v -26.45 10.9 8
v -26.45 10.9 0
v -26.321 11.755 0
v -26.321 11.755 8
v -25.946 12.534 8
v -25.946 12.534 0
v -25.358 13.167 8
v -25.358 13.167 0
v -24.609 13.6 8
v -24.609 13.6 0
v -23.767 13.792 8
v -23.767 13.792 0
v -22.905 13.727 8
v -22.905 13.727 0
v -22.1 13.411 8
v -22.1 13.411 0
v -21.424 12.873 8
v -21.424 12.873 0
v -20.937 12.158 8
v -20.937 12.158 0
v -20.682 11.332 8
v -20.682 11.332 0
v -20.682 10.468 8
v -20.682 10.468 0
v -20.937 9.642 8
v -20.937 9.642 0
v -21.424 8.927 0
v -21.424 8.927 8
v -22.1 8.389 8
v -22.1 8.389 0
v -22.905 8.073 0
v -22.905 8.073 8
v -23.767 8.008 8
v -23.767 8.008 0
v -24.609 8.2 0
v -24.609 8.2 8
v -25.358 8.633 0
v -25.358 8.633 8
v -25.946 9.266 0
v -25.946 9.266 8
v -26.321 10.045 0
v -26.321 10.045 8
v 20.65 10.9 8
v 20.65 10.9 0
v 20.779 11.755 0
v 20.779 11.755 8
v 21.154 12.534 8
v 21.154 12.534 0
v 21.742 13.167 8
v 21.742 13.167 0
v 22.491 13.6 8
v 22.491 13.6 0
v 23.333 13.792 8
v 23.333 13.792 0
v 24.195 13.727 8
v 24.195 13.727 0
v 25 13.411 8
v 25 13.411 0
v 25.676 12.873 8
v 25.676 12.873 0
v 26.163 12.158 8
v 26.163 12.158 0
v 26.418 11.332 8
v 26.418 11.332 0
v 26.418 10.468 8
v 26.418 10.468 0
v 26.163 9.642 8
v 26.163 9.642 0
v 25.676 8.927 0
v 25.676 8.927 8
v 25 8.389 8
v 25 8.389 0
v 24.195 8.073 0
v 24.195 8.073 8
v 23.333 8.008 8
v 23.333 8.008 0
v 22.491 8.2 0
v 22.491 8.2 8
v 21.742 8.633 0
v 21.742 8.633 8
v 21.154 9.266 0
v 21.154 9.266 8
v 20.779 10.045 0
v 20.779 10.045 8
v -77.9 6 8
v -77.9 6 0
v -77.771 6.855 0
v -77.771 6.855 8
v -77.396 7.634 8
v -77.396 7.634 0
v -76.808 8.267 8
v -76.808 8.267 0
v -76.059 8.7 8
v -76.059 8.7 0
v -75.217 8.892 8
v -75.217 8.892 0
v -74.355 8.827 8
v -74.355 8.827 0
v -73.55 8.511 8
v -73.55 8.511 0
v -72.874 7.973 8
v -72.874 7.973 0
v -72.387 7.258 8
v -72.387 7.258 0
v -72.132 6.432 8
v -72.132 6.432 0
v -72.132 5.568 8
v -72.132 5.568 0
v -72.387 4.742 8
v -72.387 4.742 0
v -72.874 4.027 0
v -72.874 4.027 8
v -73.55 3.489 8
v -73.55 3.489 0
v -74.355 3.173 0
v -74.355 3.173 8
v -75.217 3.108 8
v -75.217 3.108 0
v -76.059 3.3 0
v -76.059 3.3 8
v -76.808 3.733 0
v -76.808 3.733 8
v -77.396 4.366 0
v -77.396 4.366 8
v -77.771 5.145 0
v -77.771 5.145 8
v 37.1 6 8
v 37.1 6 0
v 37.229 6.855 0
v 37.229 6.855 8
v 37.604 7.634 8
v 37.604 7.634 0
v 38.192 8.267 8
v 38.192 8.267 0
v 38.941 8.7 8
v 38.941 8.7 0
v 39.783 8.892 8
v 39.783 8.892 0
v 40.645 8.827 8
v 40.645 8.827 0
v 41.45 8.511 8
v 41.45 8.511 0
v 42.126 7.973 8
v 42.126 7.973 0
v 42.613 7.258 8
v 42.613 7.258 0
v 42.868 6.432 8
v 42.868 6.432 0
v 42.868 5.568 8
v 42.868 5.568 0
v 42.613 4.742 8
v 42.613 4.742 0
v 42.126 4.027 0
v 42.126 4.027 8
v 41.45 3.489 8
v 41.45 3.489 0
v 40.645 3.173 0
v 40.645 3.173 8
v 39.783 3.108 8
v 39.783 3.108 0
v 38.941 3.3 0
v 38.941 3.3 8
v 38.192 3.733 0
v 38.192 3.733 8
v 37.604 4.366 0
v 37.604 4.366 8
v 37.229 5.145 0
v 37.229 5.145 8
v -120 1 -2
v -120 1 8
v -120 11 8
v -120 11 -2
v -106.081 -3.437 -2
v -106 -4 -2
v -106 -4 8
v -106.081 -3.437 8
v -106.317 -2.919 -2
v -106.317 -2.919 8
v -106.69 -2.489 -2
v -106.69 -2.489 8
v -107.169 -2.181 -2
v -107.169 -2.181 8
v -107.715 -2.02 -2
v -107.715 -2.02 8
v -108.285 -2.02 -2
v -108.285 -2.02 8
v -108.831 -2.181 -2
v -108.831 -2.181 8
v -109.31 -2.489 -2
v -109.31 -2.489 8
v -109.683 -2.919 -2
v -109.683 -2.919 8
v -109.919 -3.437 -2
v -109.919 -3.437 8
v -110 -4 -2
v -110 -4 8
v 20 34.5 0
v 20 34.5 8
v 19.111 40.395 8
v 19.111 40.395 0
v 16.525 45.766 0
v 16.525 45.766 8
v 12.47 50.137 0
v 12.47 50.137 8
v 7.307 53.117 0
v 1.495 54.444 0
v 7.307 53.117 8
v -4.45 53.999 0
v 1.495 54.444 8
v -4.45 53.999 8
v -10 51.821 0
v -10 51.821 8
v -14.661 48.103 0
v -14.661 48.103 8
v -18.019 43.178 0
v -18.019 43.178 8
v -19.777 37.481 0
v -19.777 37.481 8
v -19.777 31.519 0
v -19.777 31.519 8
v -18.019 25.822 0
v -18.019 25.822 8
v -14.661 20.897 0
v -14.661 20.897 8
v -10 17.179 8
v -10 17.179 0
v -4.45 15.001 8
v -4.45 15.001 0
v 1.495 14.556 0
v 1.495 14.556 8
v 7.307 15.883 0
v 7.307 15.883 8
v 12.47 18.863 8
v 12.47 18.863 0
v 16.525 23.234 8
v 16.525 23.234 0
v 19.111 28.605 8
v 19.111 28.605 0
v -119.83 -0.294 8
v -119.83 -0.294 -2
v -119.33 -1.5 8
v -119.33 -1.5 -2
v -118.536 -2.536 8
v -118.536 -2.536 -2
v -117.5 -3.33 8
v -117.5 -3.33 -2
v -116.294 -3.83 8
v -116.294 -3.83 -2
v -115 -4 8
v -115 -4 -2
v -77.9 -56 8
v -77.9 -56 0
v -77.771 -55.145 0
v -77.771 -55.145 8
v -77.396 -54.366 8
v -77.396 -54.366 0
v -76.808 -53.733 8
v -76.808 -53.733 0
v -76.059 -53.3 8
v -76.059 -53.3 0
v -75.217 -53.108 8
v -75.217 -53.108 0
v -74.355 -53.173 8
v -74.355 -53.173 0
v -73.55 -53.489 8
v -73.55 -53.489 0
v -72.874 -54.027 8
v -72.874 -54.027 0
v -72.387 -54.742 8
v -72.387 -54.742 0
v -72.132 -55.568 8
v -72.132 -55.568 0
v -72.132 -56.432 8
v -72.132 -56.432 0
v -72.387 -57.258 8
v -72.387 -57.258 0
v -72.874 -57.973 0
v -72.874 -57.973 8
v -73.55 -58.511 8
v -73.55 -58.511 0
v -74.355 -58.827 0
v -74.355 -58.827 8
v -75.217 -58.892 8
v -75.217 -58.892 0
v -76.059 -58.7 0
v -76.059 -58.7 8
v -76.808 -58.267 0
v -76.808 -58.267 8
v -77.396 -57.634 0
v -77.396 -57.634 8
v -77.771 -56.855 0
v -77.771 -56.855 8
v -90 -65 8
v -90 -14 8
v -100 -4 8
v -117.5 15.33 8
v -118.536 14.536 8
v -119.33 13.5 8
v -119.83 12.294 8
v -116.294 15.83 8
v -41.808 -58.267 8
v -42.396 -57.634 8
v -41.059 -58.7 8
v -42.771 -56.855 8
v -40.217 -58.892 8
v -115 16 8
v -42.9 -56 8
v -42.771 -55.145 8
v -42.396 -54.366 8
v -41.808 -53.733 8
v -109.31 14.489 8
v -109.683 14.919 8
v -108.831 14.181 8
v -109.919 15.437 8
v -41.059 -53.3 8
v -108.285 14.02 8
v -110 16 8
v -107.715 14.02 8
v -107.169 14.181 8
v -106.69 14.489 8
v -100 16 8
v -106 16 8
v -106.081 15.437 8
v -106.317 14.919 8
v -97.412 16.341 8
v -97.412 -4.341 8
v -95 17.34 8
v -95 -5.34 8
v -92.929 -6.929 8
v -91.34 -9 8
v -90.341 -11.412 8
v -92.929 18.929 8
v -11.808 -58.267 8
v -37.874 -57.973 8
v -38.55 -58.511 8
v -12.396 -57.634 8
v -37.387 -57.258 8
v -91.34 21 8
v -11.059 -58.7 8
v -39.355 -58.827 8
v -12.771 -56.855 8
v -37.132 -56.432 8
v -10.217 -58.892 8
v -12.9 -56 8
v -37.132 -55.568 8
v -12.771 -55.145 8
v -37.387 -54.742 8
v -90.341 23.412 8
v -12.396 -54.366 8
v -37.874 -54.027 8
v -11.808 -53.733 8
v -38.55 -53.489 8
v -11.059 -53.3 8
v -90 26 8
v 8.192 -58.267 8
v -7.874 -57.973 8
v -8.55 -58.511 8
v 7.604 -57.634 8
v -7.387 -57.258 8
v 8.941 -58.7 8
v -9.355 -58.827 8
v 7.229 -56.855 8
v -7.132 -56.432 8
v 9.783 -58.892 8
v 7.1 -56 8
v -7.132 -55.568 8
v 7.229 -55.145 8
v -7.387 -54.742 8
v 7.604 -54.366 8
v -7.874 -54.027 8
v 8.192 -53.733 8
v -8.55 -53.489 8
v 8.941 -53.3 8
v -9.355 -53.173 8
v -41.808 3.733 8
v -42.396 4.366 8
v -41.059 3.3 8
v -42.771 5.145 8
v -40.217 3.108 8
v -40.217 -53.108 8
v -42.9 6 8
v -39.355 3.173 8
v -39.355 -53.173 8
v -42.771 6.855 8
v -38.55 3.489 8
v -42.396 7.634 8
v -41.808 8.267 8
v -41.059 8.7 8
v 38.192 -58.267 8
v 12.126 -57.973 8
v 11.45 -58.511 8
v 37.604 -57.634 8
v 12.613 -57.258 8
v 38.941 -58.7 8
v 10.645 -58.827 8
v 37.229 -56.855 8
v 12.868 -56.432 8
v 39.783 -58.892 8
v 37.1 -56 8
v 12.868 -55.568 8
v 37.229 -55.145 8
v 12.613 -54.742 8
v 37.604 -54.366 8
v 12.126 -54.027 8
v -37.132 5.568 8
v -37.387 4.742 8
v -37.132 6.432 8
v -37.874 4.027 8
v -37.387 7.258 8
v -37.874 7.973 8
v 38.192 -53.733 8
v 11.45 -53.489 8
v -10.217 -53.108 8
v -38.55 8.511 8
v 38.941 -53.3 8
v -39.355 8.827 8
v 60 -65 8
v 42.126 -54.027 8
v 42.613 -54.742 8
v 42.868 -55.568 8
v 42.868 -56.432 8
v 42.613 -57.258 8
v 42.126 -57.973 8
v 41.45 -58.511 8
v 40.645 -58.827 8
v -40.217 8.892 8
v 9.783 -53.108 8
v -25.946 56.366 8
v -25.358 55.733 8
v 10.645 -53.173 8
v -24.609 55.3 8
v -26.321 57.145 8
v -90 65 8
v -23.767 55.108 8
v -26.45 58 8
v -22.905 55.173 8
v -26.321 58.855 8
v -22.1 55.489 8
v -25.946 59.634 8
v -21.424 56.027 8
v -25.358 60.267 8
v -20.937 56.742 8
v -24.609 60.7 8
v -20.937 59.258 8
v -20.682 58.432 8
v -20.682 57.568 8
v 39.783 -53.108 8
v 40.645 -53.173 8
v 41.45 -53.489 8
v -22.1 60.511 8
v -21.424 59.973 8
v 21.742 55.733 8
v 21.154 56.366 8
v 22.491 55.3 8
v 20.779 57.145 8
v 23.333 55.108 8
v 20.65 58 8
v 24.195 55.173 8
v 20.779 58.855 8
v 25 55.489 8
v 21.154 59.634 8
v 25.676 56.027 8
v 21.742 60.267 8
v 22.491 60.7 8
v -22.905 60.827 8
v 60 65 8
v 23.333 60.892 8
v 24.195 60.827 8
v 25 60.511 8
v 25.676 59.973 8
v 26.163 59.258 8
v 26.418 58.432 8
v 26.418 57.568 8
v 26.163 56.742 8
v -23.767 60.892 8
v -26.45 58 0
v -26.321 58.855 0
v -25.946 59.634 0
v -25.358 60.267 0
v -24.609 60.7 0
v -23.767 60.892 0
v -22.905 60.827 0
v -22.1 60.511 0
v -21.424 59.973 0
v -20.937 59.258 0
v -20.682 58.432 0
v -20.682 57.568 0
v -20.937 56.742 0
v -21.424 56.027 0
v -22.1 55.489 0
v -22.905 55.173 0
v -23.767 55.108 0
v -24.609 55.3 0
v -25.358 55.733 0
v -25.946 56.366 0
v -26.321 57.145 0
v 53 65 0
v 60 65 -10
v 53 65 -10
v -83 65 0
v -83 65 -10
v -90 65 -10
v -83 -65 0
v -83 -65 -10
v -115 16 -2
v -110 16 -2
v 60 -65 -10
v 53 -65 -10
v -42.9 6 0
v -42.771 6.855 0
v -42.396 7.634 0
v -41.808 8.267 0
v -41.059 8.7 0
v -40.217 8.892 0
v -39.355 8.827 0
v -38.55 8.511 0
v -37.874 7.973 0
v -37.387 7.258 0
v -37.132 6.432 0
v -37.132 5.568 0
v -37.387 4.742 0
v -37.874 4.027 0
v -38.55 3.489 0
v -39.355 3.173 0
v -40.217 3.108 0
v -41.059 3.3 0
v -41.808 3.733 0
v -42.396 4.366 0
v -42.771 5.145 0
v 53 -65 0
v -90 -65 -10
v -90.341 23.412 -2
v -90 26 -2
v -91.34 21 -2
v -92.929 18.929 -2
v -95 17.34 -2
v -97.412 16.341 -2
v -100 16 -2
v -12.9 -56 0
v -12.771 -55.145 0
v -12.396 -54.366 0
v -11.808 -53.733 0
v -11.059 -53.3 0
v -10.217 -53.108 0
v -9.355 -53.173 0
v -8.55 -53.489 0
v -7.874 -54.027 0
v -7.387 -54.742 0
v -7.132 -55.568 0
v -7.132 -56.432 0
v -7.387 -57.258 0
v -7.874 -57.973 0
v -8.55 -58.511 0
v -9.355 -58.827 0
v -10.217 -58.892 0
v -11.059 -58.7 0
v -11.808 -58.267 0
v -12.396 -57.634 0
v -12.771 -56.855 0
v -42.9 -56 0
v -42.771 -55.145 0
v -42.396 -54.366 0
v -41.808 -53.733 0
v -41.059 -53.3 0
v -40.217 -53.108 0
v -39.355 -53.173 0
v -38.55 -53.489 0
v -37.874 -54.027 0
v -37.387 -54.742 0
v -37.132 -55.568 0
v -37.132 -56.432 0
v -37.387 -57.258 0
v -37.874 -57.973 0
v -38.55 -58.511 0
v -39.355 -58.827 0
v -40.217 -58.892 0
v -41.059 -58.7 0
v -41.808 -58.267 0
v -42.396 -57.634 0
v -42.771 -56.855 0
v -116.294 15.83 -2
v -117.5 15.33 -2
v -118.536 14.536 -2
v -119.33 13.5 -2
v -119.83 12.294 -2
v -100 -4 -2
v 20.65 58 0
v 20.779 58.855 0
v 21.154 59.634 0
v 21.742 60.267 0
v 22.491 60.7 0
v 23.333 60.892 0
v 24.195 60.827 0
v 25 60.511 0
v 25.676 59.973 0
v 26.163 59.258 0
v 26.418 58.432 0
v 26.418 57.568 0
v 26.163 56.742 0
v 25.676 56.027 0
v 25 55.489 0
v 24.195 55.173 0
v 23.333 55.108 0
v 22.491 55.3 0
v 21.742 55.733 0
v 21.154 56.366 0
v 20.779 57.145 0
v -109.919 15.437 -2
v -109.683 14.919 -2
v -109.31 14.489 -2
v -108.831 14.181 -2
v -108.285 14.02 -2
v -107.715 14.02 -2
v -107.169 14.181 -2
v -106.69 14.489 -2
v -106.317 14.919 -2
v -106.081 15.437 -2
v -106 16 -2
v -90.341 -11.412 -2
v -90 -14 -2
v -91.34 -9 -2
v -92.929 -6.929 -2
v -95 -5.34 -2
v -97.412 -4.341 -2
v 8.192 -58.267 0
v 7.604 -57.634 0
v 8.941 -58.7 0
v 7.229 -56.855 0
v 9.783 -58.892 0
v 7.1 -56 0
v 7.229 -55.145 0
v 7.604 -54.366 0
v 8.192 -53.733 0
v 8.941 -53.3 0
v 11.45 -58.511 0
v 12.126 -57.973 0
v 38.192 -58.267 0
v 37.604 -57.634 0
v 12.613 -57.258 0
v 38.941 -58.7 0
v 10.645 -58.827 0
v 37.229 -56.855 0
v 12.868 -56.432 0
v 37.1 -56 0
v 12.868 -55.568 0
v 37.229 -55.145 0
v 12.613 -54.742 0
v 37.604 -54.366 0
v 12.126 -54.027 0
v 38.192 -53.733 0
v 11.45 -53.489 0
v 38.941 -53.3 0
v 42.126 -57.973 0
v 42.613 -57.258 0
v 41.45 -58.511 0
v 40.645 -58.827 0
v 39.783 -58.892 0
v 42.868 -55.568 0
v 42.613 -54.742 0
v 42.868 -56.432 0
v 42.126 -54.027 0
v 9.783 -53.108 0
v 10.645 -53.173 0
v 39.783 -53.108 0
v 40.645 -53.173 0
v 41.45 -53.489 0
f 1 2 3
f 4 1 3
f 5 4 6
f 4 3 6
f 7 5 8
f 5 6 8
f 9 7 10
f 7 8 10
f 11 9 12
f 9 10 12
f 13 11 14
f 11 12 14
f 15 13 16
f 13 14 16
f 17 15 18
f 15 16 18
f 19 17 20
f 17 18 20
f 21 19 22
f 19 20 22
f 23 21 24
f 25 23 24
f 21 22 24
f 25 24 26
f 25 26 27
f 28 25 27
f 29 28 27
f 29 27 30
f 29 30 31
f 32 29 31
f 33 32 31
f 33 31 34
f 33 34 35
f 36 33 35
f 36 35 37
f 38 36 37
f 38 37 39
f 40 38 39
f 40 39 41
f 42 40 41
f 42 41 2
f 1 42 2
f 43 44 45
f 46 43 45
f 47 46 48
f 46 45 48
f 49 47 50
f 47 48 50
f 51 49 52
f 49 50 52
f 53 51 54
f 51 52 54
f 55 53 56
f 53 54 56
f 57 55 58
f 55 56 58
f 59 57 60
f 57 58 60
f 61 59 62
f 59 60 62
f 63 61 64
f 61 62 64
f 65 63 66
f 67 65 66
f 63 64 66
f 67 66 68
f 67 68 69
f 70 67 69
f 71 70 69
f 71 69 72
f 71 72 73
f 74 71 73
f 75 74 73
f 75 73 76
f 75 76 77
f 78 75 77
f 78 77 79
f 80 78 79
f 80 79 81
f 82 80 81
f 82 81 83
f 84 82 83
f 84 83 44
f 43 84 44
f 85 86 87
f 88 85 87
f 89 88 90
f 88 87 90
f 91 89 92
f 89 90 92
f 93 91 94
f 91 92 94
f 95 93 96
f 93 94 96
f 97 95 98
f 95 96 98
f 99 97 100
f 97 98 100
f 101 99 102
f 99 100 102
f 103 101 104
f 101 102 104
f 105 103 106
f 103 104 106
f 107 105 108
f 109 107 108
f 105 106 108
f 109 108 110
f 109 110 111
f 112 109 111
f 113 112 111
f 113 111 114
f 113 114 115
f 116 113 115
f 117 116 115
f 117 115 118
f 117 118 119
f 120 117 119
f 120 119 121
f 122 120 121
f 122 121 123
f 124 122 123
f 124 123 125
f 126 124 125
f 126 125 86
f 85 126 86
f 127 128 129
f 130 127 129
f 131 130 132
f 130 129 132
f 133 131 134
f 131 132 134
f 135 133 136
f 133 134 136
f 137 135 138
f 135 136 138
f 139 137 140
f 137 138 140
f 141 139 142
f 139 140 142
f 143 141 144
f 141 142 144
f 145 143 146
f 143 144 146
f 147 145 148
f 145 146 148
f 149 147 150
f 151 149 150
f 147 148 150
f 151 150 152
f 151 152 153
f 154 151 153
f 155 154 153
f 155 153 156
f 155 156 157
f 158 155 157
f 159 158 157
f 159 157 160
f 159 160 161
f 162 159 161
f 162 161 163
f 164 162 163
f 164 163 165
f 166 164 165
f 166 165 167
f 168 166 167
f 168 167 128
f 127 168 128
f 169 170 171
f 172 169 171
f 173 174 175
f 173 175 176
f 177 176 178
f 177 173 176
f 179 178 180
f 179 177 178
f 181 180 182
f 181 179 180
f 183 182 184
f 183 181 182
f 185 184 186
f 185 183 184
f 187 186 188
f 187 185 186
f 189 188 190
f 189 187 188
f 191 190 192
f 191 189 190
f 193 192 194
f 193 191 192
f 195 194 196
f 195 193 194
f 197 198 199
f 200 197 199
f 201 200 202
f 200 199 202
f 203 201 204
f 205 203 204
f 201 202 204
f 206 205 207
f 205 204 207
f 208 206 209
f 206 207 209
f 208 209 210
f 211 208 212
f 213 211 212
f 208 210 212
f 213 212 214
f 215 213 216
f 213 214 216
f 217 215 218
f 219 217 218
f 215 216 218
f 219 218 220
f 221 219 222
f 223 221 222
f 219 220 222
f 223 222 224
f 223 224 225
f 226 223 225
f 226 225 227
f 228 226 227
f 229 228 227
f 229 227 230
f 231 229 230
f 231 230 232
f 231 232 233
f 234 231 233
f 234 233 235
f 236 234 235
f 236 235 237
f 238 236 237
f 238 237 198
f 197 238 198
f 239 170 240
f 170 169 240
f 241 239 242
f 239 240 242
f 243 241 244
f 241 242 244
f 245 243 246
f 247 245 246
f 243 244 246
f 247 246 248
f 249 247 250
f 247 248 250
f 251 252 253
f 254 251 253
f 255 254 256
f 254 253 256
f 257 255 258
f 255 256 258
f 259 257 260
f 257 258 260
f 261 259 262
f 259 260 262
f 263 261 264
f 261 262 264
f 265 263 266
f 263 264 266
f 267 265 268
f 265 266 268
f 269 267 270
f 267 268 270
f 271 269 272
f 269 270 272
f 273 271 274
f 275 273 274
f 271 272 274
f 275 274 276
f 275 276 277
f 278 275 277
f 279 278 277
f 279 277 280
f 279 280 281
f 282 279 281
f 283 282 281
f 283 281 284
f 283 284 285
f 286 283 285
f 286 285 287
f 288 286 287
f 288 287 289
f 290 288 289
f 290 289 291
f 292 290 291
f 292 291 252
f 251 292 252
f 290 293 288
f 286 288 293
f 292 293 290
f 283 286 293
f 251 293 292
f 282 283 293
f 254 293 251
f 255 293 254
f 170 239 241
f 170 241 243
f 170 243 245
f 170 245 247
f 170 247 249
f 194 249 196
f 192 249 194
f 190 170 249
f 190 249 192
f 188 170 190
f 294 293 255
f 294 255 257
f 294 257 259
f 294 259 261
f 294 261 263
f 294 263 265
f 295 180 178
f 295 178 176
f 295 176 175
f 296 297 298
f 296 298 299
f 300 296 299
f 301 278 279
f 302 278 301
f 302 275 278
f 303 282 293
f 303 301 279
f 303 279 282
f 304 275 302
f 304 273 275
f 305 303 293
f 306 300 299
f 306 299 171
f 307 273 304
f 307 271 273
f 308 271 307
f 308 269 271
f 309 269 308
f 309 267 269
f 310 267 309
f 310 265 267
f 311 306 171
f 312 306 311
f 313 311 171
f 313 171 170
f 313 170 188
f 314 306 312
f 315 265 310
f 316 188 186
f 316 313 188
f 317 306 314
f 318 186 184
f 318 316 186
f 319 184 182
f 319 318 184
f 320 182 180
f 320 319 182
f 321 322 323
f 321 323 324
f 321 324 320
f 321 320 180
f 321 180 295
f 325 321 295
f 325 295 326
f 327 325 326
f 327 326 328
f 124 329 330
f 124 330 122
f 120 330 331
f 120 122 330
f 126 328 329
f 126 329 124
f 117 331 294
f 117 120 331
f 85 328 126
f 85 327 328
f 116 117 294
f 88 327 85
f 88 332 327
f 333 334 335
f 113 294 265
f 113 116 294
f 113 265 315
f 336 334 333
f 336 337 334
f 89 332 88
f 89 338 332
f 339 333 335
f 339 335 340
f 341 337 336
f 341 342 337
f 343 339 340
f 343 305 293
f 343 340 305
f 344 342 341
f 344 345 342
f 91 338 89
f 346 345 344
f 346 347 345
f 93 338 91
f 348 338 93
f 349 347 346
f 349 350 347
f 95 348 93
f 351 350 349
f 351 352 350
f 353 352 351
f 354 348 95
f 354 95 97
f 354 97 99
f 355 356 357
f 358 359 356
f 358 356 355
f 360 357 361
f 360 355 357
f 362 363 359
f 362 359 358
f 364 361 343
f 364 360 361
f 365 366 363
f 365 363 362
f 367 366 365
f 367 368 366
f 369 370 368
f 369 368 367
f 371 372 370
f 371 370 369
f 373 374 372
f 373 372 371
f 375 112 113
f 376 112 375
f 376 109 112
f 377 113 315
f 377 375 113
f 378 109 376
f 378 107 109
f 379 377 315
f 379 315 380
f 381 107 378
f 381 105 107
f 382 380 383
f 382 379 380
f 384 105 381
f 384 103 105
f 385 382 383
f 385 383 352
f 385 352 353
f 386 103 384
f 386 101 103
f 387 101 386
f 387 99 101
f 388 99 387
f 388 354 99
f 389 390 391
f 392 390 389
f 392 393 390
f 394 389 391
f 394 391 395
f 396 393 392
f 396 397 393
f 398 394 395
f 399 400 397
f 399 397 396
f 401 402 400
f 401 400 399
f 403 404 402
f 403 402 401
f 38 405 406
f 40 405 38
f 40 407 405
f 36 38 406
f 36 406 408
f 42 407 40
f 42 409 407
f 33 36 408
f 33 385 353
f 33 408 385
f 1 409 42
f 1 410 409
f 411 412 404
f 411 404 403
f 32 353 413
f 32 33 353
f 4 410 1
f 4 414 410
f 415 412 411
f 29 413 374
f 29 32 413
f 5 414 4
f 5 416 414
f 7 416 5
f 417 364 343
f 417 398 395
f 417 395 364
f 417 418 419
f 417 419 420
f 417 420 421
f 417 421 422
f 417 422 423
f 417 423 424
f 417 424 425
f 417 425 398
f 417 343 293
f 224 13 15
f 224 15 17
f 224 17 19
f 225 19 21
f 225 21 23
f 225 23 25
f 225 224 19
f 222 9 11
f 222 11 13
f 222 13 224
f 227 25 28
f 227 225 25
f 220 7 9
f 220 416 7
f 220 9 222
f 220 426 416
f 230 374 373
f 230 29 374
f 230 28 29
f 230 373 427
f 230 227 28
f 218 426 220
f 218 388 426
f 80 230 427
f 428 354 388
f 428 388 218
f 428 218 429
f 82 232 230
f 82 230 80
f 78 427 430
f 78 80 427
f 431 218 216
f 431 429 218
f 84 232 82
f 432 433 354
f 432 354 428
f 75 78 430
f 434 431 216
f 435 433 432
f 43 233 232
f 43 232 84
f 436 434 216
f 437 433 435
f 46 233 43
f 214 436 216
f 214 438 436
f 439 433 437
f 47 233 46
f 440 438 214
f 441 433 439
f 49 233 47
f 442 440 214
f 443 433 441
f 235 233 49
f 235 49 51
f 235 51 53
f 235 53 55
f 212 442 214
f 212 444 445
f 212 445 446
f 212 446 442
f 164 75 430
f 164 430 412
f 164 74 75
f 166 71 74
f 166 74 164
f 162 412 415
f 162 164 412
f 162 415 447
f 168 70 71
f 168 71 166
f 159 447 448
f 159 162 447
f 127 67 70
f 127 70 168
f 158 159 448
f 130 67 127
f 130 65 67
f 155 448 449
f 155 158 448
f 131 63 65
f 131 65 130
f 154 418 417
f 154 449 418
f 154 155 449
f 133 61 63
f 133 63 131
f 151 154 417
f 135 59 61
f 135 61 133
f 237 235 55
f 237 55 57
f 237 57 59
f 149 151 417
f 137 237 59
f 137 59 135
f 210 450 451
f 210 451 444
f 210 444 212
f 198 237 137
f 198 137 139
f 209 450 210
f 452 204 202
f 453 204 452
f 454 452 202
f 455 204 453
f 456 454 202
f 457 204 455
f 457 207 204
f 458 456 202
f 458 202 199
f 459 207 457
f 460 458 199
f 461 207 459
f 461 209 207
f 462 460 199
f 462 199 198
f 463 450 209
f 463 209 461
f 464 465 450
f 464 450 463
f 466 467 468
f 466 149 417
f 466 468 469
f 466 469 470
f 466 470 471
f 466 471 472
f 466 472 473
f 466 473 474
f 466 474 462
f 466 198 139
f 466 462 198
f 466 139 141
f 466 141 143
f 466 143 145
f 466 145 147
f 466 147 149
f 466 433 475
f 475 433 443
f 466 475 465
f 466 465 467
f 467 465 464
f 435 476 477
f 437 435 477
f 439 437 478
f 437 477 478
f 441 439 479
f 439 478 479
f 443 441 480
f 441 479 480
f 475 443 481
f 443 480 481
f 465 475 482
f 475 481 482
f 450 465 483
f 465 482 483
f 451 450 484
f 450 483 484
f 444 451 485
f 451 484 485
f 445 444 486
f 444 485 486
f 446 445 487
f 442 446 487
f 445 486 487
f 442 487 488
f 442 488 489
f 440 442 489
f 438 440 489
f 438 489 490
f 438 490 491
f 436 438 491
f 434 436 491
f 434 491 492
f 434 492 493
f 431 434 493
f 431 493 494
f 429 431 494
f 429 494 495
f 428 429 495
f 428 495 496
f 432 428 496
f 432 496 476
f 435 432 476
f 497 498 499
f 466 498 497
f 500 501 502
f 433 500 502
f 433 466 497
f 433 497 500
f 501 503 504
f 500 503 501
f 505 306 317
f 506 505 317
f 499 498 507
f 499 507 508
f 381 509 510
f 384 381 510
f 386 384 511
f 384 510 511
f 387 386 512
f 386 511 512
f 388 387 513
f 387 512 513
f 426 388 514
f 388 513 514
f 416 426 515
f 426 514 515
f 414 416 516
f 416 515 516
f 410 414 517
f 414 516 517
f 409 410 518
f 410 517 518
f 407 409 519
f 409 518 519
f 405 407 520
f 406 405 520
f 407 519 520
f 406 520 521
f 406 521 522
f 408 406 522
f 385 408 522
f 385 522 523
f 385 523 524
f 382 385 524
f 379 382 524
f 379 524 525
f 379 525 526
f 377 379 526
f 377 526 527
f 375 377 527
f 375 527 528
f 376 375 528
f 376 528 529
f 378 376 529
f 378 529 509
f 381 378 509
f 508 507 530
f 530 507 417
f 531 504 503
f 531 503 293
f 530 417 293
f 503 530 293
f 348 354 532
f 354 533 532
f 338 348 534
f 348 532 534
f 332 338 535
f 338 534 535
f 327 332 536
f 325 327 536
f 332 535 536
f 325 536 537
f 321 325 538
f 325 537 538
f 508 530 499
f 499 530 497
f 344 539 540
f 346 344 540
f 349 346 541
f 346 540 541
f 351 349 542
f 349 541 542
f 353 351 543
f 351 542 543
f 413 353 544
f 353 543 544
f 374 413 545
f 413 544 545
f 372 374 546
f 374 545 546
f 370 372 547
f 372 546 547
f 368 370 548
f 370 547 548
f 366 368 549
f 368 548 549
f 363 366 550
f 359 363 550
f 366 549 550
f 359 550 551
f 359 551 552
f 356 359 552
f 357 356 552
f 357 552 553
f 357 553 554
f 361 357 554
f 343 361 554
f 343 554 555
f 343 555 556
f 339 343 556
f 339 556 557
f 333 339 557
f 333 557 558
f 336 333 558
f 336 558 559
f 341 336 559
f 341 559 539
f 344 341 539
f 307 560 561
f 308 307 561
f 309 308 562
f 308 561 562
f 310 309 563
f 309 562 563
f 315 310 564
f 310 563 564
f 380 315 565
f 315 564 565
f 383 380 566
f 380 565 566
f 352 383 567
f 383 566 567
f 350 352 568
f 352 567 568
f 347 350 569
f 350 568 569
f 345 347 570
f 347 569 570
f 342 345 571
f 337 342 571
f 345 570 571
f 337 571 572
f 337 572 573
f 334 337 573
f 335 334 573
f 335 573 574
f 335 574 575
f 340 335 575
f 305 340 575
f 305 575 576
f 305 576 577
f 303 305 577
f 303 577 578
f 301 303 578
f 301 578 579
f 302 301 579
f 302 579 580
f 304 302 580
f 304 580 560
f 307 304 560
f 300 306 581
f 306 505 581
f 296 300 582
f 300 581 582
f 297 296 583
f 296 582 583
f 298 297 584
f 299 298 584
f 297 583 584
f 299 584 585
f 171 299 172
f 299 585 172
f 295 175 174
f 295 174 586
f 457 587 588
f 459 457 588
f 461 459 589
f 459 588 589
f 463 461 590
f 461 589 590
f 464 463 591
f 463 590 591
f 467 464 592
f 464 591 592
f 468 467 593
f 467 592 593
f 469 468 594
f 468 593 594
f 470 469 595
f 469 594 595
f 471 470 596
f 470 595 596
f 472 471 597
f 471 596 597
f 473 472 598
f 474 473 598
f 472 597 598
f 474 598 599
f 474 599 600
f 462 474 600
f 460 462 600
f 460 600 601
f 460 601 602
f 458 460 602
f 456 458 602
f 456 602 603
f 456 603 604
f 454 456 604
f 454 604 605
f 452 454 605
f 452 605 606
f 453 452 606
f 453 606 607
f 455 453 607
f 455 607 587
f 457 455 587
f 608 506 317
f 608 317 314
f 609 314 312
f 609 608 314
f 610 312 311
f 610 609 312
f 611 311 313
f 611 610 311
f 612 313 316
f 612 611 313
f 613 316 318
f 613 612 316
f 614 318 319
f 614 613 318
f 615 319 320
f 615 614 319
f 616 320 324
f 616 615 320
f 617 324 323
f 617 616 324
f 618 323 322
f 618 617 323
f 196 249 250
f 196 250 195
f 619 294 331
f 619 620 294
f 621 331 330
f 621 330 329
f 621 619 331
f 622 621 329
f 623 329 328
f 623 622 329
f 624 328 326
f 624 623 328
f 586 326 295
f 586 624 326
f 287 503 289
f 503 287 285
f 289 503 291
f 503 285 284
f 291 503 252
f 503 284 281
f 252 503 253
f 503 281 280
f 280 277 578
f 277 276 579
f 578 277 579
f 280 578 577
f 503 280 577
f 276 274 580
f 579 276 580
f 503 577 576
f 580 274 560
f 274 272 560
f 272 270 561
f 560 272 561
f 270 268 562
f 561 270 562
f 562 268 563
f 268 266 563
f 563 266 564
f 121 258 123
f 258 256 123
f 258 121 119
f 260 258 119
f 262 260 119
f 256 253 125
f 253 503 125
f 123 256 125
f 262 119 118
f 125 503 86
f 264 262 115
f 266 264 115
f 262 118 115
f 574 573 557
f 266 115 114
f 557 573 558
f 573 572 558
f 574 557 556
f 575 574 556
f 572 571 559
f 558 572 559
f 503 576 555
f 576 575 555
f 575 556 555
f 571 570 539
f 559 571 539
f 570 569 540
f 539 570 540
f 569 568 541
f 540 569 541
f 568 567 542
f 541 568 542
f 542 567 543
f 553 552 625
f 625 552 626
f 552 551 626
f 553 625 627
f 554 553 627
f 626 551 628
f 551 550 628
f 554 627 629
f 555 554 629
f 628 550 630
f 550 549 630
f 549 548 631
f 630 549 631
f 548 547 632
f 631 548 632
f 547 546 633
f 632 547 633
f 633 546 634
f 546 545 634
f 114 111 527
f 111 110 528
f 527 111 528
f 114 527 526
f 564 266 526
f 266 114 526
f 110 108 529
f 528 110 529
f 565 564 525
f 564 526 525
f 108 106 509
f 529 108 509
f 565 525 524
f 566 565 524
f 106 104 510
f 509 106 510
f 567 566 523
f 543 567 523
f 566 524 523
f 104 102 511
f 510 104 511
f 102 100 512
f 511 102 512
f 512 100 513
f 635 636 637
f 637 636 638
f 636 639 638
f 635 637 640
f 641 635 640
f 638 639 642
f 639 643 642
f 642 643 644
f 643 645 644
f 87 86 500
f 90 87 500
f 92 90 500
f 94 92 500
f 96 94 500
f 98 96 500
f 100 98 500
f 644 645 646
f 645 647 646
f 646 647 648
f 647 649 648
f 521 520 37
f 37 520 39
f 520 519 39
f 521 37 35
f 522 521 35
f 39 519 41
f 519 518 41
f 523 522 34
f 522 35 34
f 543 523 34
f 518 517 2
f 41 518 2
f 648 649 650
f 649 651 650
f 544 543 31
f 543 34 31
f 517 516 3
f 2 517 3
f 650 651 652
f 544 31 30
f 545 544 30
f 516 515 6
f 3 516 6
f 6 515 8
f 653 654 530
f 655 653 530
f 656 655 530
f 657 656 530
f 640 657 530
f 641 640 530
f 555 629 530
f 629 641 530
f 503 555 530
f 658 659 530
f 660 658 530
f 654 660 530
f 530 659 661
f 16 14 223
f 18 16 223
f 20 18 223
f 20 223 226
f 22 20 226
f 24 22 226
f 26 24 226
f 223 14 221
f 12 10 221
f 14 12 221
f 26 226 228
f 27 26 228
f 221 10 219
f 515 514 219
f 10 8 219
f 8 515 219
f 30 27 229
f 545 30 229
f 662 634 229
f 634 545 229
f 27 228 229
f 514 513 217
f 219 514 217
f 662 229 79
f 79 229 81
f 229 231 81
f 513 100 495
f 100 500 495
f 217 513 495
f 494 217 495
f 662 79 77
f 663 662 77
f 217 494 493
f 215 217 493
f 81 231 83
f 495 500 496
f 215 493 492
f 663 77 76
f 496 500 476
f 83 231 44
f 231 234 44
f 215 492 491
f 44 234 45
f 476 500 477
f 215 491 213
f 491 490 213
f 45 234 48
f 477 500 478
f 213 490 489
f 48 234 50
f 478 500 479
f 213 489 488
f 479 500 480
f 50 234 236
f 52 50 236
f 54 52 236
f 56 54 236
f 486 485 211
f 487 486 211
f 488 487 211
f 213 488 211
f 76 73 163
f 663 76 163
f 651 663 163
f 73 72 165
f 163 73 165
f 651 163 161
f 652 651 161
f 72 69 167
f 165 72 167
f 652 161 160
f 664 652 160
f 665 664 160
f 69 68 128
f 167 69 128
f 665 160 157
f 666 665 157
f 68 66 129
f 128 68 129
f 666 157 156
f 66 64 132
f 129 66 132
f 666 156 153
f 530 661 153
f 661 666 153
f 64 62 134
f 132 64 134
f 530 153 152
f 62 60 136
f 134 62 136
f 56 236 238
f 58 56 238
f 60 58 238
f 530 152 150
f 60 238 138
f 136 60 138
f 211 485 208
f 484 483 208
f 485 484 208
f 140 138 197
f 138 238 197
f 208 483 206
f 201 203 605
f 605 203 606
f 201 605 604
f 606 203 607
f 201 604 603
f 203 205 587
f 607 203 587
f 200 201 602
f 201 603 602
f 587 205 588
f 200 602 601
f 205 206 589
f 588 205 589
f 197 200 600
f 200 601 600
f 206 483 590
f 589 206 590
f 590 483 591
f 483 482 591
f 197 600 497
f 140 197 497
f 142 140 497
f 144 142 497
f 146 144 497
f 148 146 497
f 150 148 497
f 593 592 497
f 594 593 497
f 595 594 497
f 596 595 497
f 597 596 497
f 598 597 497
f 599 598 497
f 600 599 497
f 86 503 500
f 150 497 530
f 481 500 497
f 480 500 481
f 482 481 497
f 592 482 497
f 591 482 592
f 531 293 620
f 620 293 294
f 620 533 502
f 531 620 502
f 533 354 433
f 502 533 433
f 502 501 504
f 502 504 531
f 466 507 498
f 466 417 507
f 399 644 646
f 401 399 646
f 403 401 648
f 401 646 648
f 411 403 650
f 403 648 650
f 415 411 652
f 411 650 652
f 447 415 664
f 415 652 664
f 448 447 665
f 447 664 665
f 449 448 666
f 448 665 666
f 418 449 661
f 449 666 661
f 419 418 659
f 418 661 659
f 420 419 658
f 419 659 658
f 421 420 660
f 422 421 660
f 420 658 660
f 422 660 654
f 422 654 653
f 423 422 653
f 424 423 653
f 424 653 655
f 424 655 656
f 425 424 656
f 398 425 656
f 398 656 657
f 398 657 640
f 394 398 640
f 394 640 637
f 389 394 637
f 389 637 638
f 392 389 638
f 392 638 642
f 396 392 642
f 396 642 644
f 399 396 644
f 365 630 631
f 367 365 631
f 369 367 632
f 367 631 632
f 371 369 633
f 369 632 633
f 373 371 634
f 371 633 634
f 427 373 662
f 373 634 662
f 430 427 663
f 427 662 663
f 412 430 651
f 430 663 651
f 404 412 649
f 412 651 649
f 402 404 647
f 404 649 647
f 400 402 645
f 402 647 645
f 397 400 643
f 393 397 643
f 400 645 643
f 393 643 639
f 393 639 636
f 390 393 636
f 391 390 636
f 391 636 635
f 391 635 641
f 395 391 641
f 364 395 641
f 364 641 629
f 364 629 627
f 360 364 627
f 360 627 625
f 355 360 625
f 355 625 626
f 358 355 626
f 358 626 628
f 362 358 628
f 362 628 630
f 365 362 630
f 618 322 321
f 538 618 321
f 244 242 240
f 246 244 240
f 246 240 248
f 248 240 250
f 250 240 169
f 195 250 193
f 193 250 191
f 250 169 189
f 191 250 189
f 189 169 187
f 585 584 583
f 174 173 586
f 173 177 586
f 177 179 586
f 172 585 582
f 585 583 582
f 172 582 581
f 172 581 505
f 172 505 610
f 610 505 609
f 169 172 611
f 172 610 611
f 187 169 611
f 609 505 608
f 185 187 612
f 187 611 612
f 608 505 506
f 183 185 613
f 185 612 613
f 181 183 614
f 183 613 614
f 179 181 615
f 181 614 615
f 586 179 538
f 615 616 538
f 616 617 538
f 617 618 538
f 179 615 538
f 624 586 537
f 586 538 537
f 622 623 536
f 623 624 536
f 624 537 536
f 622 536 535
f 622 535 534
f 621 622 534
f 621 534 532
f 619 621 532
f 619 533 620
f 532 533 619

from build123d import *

# Parameters (mm, degrees)
SKETCH1_W            = 100
SKETCH1_H            = 130
BOSS_EXTRUDE1_DEPTH  = 8
M5_CLEARANCE_HOLE1_D = 5.8
SKETCH6_R            = 20
CUT_EXTRUDE1_DEPTH   = 10
SKETCH9_W            = 40
SKETCH9_H            = 130
SKETCH9_W_2          = 10
BOSS_EXTRUDE2_DEPTH  = 8
M5_CLEARANCE_HOLE2_D = 5.8
SKETCH13_W           = 7
SKETCH13_H           = 130
BOSS_EXTRUDE3_DEPTH  = 10
SKETCH14_W           = 30
SKETCH14_H           = 20
BOSS_EXTRUDE4_DEPTH  = 10
FILLET1_R            = 10
FILLET2_R            = 5
CUT_EXTRUDE2_REACH   = 138.839


with BuildPart() as part:
    # Sketch1 → Boss-Extrude1 (new body)
    with BuildSketch(Plane.XY):
        Rectangle(SKETCH1_W, SKETCH1_H)
    extrude(amount=BOSS_EXTRUDE1_DEPTH)

    # M5 Clearance Hole1 (through all)
    with Locations(Plane.XY.offset(8)):
        with Locations((-40, 6), (40, 6), (-40, -56), (40, -56), (-23.55, 58), (23.55, 58), (-23.55, 10.9), (23.55, 10.9), (-10, -56), (10, -56)):
            Hole(M5_CLEARANCE_HOLE1_D / 2)

    # Sketch6 → Cut-Extrude1 (cut)
    with BuildSketch(Plane.XY.offset(8)):
        with Locations((0, 34.5)):
            Circle(SKETCH6_R)
    extrude(amount=-CUT_EXTRUDE1_DEPTH, mode=Mode.SUBTRACT)

    # Sketch9 → Boss-Extrude2 (add)
    with BuildSketch(Plane.XY.offset(8)):
        with Locations((-70, 0)):
            Rectangle(SKETCH9_W, SKETCH9_H)
        with Locations((55, 0)):
            Rectangle(SKETCH9_W_2, SKETCH9_H)
    extrude(amount=-BOSS_EXTRUDE2_DEPTH)

    # M5 Clearance Hole2 (through all)
    with Locations(Plane.XY.offset(8)):
        with Locations((-75, 6), (-75, -56)):
            Hole(M5_CLEARANCE_HOLE2_D / 2)

    # Sketch13 → Boss-Extrude3 (add)
    with BuildSketch(Plane(origin=(0, 0, 0), x_dir=(-1, 0, 0), z_dir=(0, 0, -1))):
        with Locations((-56.5, 0)):
            Rectangle(SKETCH13_W, SKETCH13_H)
        with Locations((86.5, 0)):
            Rectangle(SKETCH13_W, SKETCH13_H)
    extrude(amount=BOSS_EXTRUDE3_DEPTH)

    # Sketch14 → Boss-Extrude4 (add)
    with BuildSketch(Plane.XY.offset(8)):
        with Locations((-105, 6)):
            Rectangle(SKETCH14_W, SKETCH14_H)
    extrude(amount=-BOSS_EXTRUDE4_DEPTH)

    # Fillet1
    fillet1_edges = [part.edges().sort_by_distance(p)[0] for p in [
        (-90, 16, 3),
        (-90, -4, 3),
    ]]
    fillet(fillet1_edges, radius=FILLET1_R)

    # Fillet2
    fillet2_edges = [part.edges().sort_by_distance(p)[0] for p in [
        (-120, -4, 3),
        (-120, 16, 3),
    ]]
    fillet(fillet2_edges, radius=FILLET2_R)

    # Sketch15 → Cut-Extrude2 (cut, up to next)
    with BuildSketch(Plane(origin=(0, 0, -2), x_dir=(-1, 0, 0), z_dir=(0, 0, -1)), mode=Mode.PRIVATE) as cut_extrude2_sk1:
        with BuildLine():
            Line((106, 16), (110, 16))
            ThreePointArc((110, 16), (108, 14), (106, 16))
        make_face()
    cut_extrude2_tool1 = extrude(cut_extrude2_sk1.sketch, amount=-CUT_EXTRUDE2_REACH, mode=Mode.PRIVATE) & part.part
    # Sketch15 → Cut-Extrude2 (cut, up to next)
    with BuildSketch(Plane(origin=(0, 0, -2), x_dir=(-1, 0, 0), z_dir=(0, 0, -1)), mode=Mode.PRIVATE) as cut_extrude2_sk2:
        with BuildLine():
            Line((110, -4), (106, -4))
            ThreePointArc((106, -4), (108, -2), (110, -4))
        make_face()
    cut_extrude2_tool2 = extrude(cut_extrude2_sk2.sketch, amount=-CUT_EXTRUDE2_REACH, mode=Mode.PRIVATE) & part.part
    add(cut_extrude2_tool1.solids().sort_by_distance((-108, 15.151174, -2))[0], mode=Mode.SUBTRACT)
    add(cut_extrude2_tool2.solids().sort_by_distance((-108, -3.151174, -2))[0], mode=Mode.SUBTRACT)


solid = part.part
